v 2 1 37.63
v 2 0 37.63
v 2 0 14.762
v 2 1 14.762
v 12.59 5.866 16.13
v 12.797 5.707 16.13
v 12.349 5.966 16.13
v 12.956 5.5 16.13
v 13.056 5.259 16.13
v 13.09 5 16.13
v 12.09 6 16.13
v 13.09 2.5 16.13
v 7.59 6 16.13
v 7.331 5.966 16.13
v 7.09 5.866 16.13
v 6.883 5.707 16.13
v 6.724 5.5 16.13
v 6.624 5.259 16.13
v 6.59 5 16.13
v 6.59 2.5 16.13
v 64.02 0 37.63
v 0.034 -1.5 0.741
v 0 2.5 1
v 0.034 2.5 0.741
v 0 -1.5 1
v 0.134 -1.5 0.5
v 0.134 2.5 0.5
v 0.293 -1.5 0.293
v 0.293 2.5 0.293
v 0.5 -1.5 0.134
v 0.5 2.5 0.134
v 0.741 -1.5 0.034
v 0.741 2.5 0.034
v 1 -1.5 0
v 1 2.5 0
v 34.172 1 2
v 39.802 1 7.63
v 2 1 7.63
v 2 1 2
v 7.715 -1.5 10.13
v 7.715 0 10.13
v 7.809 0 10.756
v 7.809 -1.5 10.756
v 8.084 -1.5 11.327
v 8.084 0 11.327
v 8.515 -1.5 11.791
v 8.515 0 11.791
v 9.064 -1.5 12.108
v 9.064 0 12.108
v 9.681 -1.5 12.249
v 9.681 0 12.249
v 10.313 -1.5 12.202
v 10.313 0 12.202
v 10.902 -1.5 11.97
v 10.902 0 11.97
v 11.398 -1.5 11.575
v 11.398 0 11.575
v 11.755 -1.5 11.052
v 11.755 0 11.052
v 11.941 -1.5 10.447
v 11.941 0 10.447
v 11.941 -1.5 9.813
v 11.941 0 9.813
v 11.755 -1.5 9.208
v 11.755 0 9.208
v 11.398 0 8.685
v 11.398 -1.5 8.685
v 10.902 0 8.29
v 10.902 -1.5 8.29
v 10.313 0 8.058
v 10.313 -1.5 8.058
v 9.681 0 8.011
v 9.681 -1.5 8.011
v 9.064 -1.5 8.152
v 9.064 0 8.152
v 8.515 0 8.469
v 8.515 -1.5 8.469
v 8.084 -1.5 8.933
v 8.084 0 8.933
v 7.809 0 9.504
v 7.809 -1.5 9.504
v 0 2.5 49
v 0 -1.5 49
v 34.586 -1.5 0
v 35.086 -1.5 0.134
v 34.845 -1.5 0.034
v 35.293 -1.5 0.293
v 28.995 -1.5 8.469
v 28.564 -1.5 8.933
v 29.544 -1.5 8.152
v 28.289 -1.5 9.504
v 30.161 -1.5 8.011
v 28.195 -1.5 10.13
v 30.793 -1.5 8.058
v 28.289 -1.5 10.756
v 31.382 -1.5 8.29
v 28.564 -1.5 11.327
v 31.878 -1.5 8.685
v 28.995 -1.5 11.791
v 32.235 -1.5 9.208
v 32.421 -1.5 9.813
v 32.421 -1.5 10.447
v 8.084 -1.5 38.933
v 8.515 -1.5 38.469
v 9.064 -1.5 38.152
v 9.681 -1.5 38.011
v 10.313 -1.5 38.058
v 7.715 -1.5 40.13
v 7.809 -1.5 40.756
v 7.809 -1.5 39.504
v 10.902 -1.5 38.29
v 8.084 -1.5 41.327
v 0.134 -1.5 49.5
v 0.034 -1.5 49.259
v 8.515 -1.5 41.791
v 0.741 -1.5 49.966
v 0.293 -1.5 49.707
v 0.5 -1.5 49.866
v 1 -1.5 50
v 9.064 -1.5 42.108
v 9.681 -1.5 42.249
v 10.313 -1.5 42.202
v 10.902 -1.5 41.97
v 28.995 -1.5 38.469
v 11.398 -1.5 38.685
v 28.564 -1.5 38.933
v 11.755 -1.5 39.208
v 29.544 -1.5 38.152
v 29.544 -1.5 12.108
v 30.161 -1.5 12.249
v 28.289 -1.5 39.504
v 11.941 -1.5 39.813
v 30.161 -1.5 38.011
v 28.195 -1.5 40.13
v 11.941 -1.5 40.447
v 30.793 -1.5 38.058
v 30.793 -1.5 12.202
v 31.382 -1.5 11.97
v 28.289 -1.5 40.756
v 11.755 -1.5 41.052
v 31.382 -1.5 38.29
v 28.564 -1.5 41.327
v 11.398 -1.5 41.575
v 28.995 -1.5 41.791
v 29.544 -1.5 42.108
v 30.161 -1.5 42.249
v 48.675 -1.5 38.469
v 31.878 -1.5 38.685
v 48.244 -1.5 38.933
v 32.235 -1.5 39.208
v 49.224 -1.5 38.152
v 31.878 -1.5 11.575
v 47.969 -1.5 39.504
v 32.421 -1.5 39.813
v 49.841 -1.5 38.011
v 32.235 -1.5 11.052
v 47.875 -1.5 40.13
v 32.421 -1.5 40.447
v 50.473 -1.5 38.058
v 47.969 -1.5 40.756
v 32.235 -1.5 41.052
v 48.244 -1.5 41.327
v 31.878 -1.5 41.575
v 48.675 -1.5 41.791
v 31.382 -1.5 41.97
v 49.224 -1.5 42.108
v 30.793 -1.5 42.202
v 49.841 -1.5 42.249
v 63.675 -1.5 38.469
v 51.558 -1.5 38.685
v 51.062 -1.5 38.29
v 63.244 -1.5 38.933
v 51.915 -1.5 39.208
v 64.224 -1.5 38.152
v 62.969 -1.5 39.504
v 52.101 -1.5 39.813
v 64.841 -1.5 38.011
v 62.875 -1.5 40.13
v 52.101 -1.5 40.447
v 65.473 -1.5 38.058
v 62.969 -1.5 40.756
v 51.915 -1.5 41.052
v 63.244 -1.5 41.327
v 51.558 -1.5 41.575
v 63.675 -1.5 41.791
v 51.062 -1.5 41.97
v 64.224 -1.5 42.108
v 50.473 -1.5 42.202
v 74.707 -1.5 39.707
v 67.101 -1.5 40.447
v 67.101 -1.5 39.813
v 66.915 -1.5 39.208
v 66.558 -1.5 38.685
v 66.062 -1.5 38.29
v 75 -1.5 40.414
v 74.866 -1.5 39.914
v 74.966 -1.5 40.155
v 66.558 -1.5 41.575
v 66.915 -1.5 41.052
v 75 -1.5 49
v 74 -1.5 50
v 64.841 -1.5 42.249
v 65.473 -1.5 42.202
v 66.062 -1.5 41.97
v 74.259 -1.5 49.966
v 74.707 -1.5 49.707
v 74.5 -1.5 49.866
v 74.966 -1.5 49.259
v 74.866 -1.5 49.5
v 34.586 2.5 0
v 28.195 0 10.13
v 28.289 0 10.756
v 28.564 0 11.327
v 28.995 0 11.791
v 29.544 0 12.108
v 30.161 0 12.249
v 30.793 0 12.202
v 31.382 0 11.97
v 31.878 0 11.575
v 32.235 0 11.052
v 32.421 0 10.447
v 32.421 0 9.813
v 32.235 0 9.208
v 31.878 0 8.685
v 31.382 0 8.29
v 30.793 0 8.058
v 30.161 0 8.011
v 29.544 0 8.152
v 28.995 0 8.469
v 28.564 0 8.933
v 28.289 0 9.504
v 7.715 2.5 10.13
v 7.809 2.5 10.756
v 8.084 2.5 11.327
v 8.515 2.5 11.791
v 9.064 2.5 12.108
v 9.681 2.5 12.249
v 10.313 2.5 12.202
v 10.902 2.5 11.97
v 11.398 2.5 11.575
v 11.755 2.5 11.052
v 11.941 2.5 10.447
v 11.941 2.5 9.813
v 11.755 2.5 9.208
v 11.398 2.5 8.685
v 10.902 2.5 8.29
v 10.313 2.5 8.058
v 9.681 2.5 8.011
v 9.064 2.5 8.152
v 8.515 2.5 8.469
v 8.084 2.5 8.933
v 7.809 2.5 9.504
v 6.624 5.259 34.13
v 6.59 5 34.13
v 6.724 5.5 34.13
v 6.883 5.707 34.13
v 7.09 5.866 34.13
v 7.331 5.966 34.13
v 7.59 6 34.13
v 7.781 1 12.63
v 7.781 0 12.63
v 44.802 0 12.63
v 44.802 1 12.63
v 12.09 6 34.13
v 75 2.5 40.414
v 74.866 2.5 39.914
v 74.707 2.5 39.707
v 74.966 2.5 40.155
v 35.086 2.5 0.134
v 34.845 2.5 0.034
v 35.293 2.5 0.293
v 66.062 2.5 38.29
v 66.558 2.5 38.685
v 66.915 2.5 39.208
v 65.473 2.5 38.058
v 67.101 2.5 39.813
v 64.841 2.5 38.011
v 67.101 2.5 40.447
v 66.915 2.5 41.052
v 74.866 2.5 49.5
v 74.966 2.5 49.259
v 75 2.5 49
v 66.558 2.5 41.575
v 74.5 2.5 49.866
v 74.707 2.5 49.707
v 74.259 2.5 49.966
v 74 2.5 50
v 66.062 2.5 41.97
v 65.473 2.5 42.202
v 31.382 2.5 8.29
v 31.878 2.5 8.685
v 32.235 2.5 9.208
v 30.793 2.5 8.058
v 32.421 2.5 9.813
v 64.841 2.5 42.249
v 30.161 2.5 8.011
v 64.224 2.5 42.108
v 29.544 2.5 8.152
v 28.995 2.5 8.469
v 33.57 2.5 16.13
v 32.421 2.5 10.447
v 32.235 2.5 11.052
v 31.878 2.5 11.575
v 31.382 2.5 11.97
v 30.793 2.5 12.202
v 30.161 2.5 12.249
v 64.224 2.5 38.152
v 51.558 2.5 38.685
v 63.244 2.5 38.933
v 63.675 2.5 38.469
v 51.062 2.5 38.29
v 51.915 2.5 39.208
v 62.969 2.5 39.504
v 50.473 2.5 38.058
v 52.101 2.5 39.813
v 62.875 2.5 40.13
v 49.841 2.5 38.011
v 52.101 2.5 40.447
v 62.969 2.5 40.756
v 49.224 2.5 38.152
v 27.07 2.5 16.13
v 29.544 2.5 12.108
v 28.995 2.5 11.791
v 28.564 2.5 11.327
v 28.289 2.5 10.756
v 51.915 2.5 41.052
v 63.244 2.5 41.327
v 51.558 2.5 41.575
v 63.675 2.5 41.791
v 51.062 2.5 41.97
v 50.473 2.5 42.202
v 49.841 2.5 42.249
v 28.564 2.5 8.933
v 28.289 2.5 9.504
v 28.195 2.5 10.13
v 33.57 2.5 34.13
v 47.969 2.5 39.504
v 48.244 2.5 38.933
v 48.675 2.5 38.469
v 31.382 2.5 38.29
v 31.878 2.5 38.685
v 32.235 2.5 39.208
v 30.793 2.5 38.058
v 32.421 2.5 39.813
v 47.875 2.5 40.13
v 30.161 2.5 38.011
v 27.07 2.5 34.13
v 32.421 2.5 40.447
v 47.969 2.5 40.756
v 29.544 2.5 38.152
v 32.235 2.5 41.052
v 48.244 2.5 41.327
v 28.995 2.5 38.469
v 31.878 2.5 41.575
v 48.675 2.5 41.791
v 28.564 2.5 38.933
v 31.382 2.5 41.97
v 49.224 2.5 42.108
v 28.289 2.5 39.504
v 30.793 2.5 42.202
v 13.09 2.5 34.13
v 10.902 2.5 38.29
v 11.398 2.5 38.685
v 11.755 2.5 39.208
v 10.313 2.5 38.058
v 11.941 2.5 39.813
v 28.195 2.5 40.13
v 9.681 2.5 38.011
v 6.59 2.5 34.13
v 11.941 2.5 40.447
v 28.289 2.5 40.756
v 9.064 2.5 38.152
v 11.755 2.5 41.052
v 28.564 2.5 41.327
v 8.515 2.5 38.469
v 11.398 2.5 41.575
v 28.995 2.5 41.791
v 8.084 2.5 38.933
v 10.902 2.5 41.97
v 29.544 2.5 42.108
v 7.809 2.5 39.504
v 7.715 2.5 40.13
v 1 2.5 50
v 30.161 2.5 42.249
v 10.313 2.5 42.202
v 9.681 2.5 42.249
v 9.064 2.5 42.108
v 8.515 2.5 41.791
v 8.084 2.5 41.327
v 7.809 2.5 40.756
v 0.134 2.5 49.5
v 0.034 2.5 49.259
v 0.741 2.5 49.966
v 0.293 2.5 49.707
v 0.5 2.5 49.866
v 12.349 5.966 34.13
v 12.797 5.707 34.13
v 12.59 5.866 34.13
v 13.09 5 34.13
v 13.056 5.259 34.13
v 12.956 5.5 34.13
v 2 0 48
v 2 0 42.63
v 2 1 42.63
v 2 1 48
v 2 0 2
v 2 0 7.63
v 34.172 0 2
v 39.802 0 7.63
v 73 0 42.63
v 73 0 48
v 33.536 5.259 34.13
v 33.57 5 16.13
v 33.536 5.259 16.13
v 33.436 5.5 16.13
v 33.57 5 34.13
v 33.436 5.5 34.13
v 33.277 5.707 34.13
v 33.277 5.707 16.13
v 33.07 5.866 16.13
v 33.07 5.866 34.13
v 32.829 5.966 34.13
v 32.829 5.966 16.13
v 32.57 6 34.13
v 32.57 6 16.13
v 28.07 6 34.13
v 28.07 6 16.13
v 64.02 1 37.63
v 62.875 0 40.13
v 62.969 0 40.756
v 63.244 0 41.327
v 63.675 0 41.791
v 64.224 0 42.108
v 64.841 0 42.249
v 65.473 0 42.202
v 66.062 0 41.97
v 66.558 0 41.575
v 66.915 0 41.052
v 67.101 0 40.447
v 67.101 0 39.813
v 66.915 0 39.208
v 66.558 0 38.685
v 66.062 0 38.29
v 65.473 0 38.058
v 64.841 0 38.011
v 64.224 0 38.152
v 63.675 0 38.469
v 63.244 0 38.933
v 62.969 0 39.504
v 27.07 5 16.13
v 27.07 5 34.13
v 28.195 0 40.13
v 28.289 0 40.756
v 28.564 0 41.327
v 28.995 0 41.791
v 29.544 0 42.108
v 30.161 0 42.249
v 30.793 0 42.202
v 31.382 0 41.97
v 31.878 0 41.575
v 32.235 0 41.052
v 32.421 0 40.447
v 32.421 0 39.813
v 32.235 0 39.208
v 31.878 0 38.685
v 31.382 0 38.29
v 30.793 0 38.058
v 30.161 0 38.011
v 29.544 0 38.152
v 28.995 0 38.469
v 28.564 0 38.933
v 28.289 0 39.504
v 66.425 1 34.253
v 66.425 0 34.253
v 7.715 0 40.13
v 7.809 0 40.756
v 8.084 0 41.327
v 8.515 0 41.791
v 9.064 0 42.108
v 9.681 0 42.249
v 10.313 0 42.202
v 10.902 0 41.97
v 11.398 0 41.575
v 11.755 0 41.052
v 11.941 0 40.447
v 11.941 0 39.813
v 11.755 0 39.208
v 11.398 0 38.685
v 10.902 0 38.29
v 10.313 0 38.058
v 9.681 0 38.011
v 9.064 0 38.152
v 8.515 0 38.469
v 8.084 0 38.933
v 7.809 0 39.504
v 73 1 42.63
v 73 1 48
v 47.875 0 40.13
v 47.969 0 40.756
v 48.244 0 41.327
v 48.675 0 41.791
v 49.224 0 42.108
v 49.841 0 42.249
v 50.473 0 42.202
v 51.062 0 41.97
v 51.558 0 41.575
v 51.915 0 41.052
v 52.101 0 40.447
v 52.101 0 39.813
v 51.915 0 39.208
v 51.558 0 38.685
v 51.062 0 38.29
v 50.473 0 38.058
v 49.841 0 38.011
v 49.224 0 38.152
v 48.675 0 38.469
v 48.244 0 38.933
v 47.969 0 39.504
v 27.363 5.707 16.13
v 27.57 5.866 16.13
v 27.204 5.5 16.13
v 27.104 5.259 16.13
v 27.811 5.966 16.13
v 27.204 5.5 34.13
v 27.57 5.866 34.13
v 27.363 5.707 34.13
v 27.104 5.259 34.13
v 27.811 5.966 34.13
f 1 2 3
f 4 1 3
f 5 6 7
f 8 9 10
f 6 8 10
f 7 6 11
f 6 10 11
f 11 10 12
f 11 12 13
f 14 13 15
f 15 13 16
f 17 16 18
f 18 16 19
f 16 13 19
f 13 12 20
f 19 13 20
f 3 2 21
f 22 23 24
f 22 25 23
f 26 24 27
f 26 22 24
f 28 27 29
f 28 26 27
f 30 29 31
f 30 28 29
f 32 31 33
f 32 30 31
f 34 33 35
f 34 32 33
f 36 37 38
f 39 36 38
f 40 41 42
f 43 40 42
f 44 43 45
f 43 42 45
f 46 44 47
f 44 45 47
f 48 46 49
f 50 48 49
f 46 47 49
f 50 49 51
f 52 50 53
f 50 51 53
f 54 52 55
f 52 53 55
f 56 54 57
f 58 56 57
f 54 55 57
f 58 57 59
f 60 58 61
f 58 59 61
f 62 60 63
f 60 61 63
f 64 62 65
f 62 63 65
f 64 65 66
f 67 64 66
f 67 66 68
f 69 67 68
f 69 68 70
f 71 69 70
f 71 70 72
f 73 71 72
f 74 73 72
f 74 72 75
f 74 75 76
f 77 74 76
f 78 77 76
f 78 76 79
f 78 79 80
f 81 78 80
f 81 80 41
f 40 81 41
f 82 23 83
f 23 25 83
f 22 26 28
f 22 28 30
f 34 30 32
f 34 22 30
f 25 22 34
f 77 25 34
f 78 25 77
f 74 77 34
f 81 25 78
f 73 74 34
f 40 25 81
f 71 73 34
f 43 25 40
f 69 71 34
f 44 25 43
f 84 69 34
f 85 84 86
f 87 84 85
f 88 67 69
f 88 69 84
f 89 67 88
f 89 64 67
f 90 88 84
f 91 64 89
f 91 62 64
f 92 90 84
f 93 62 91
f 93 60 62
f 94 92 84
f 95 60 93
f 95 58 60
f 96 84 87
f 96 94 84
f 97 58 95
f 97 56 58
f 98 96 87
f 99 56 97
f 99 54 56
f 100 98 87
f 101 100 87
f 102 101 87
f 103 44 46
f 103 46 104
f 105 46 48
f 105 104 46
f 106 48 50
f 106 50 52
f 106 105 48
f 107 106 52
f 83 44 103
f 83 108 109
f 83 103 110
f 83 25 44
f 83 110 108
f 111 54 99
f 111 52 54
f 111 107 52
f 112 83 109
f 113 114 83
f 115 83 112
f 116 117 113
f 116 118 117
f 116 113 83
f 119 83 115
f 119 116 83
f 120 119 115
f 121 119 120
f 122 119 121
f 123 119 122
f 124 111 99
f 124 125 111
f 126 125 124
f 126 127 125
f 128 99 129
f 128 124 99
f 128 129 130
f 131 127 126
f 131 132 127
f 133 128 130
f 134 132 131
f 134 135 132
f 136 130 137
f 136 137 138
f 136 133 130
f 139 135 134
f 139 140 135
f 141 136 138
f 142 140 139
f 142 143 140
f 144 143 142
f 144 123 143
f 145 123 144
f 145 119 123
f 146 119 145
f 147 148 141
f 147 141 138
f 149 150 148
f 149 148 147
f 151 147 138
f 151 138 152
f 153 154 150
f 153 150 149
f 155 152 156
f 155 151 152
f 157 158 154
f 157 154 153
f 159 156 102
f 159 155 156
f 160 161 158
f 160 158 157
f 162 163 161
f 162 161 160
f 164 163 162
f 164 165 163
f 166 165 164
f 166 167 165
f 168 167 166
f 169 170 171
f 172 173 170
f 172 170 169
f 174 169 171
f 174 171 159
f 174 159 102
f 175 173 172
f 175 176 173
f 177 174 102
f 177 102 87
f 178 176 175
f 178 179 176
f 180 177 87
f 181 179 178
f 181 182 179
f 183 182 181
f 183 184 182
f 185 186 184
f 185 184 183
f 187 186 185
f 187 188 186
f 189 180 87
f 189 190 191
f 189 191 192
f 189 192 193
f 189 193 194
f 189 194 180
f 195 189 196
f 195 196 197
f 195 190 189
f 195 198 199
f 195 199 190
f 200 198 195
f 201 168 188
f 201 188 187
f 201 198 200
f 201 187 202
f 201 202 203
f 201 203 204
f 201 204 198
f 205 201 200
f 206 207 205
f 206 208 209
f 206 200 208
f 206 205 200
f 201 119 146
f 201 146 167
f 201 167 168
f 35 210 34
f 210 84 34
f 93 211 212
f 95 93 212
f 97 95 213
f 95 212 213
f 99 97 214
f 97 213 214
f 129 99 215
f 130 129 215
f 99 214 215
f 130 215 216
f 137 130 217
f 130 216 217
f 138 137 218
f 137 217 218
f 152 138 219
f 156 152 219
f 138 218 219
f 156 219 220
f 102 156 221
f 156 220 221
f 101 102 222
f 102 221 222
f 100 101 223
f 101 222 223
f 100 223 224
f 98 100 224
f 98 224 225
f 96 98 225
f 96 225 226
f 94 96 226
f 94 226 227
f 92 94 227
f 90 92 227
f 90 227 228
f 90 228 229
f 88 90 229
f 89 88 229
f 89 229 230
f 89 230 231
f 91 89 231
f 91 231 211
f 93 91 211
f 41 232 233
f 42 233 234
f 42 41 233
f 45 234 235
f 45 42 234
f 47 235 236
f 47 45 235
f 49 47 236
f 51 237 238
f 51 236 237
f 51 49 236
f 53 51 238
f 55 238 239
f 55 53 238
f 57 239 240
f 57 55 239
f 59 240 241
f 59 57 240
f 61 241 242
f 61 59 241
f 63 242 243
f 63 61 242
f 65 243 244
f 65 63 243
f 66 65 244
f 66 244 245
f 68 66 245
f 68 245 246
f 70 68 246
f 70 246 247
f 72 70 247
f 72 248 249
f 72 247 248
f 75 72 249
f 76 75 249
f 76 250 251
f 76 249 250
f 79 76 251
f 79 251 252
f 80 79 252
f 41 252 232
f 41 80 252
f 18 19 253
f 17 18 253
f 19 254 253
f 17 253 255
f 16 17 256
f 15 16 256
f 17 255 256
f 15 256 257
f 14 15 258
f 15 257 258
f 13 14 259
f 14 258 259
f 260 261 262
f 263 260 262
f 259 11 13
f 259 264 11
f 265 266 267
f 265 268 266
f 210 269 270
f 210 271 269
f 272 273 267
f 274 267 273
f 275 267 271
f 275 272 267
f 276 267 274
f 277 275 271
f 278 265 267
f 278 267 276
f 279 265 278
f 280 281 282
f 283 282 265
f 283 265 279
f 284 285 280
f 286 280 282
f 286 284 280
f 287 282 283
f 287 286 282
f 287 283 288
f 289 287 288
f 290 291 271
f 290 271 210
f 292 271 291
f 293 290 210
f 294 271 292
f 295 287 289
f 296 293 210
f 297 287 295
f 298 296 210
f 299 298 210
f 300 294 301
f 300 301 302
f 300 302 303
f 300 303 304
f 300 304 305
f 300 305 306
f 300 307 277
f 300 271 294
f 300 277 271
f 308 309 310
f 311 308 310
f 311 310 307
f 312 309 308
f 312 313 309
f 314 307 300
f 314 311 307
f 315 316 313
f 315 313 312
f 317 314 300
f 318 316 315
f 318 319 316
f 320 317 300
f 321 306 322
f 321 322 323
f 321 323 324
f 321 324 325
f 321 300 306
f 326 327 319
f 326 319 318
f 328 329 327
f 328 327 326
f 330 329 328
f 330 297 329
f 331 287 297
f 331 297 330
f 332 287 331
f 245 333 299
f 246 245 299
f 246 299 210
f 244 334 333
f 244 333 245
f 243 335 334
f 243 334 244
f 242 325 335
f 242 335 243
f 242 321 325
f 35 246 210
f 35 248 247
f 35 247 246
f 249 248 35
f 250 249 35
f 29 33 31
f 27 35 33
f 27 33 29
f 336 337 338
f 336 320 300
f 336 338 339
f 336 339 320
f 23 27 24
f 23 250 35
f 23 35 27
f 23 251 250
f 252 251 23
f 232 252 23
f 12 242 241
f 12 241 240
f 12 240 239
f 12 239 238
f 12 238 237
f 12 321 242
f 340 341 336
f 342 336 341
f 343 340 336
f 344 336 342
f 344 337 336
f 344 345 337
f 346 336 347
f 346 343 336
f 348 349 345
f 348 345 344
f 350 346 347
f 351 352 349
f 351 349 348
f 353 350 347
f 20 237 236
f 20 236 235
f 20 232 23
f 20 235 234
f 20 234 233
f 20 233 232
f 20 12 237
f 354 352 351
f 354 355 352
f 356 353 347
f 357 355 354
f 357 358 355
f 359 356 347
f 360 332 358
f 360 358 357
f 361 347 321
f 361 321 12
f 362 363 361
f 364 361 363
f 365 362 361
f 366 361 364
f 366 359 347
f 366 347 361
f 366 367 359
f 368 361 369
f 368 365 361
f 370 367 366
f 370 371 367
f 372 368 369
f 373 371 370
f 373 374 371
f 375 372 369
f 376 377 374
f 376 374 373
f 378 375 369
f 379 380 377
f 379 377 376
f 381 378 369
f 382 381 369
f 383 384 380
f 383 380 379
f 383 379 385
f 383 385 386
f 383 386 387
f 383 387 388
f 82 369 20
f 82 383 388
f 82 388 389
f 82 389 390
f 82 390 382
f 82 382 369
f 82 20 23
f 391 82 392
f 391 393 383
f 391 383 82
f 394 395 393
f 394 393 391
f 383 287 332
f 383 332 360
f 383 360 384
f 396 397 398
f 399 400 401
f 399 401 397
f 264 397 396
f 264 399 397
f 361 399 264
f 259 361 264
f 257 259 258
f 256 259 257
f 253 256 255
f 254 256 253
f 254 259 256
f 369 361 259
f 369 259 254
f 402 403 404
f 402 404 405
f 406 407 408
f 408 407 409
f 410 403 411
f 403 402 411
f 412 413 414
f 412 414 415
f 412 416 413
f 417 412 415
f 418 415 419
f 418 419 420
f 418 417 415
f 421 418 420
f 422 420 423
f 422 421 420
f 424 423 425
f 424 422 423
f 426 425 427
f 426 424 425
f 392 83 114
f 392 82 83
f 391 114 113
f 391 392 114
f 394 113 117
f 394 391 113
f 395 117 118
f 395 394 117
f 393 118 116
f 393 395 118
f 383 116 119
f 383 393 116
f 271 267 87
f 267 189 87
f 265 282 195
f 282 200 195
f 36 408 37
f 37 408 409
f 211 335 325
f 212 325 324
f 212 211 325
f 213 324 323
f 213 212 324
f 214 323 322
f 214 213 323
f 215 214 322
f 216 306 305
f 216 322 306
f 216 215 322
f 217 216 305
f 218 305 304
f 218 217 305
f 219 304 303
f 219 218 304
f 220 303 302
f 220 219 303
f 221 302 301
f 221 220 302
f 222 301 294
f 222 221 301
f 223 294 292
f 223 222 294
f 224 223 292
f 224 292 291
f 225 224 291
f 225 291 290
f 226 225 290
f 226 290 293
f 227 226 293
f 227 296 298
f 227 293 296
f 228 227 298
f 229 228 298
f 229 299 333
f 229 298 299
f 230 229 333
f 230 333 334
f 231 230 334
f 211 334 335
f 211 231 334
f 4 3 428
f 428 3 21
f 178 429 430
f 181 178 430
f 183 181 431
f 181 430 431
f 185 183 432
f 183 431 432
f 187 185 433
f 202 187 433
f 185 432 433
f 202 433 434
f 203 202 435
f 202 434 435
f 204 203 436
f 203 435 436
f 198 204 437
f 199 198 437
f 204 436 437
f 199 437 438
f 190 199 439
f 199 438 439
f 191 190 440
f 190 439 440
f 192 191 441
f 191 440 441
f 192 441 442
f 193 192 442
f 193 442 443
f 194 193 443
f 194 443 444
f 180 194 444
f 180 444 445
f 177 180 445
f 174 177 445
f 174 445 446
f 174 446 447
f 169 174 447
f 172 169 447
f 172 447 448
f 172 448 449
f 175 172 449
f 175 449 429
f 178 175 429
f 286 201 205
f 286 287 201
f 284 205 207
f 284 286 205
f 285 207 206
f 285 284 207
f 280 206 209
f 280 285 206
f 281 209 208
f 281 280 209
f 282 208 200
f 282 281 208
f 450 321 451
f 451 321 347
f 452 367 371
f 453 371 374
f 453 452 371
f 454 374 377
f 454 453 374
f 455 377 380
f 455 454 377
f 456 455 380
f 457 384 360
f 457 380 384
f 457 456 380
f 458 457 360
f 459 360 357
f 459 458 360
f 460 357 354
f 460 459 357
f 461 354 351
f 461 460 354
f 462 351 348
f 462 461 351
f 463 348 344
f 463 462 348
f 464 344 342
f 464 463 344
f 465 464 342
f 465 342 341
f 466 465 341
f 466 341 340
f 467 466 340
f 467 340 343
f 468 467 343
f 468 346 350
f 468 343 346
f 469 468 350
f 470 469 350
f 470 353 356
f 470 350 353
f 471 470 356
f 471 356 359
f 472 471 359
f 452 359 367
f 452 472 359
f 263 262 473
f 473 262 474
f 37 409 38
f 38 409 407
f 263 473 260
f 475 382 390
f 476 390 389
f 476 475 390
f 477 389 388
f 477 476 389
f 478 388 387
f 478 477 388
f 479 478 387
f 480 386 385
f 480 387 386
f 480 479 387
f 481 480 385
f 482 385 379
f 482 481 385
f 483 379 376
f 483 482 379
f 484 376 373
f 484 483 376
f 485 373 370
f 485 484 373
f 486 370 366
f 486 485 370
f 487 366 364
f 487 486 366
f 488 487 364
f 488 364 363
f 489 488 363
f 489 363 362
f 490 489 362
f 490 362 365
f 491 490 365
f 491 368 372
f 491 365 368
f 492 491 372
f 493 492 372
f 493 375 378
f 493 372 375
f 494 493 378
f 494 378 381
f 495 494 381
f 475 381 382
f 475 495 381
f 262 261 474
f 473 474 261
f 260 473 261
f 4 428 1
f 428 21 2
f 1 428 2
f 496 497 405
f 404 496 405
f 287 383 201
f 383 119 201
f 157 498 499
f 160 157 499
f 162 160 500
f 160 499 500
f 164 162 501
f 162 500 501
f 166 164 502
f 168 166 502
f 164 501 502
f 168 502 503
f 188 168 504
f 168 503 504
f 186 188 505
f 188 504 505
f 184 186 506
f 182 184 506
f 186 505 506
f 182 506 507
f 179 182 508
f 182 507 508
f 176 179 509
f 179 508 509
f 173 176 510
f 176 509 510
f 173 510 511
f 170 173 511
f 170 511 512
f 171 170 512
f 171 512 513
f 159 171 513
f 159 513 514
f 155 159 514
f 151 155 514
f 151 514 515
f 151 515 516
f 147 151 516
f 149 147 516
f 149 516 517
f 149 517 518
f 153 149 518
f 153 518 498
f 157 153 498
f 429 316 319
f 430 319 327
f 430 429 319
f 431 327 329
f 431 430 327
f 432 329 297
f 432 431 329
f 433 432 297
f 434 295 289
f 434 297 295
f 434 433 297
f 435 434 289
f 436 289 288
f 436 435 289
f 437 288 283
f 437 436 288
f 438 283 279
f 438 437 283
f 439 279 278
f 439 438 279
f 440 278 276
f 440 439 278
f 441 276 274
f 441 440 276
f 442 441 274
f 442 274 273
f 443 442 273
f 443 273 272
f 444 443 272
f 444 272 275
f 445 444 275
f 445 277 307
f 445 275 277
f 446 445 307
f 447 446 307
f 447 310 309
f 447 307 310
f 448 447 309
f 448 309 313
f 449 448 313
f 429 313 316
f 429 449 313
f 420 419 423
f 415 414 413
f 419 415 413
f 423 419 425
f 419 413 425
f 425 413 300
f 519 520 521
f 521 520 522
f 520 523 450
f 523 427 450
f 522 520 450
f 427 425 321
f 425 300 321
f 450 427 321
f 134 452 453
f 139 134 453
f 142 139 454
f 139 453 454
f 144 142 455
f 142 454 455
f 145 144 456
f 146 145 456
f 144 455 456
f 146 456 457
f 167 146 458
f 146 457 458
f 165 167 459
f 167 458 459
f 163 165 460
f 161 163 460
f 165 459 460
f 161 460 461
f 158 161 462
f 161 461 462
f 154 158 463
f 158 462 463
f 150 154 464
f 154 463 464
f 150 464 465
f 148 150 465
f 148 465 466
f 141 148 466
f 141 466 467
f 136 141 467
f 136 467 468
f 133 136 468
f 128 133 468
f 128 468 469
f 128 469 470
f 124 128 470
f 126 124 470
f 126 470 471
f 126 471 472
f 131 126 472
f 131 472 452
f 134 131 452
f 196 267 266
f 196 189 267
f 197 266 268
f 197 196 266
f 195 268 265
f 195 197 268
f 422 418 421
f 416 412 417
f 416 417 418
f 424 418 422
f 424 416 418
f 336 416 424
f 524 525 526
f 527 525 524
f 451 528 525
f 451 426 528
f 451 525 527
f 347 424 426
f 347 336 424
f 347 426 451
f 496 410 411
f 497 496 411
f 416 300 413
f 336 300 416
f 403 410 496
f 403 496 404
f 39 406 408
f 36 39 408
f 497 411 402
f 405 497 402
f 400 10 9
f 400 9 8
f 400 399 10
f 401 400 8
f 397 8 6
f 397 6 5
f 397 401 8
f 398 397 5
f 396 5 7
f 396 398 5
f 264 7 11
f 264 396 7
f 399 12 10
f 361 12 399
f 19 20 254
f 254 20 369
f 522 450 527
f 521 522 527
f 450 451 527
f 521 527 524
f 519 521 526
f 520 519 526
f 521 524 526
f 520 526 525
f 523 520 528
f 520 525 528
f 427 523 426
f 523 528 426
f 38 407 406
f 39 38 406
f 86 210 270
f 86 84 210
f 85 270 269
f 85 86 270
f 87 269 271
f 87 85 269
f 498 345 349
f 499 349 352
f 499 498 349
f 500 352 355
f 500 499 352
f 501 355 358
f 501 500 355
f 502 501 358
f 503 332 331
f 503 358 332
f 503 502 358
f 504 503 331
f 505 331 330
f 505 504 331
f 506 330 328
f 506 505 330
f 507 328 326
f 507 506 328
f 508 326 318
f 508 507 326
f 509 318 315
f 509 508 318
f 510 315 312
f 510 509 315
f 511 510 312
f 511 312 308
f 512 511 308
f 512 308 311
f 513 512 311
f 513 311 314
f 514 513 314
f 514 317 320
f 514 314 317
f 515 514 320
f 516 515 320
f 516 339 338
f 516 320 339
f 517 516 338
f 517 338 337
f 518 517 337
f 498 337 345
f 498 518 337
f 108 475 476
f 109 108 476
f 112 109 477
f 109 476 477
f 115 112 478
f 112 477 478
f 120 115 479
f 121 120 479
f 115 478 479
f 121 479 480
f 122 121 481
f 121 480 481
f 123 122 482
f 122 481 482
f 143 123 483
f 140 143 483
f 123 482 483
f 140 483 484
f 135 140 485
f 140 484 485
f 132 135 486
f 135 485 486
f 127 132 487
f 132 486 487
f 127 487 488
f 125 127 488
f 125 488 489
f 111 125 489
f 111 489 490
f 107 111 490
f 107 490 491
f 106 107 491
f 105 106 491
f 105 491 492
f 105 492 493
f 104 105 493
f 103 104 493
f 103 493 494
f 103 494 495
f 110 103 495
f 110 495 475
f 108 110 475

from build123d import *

# Parameters (mm, degrees)
F1_DEPTH      = 1.5
F2_W          = 71
F2_H          = 5.37
F3_DEPTH      = 1
F5_DEPTH      = 1.5
F6_R          = 2.125
F7_DEPTH      = 25
F7_DEPTH_BACK = 25
F8_W          = 6.5
F8_H          = 18
F9_DEPTH      = 3.5
F10_R         = 1


with BuildPart() as f1:
    # F0 (on Front) → F1 (new body)
    with BuildSketch(Plane.XZ):
        Polygon((0, 50), (0, 0), (35, 0), (75, 40), (75, 50), align=None)
    extrude(amount=F1_DEPTH)

    # F2 (on face) → F3 (join)
    with BuildSketch(Plane(origin=(0, 0, 0), x_dir=(-1, 0, 0), z_dir=(0, 1, 0))):
        Polygon((0, 0), (0, 50), (-75, 50), (-75, 40), (-35, 0), align=None)
        Polygon((-2, 7.63), (-2, 2), (-34.1715728753, 2), (-39.8015728753, 7.63), align=None, mode=Mode.SUBTRACT)
        Polygon((-44.8015728753, 12.63), (-66.4248850161, 34.2533121408), (-7.7811020593, 12.63), align=None, mode=Mode.SUBTRACT)
        Polygon((-2, 14.7616253496), (-64.020470816, 37.63), (-2, 37.63), align=None, mode=Mode.SUBTRACT)
        with Locations((-37.5, 45.315)):
            Rectangle(F2_W, F2_H, mode=Mode.SUBTRACT)
    extrude(amount=F3_DEPTH)

    # F4 (on face) → F5 (join)
    with BuildSketch(Plane(origin=(0, 1, 0), x_dir=(-1, 0, 0), z_dir=(0, 1, 0))):
        Polygon((0, 0), (0, 50), (-75, 50), (-75, 40), (-35, 0), align=None)
    extrude(amount=F5_DEPTH)

    # F6 (on face) → F7 (cut, two sides)
    with BuildSketch(Plane(origin=(0, 0, 0), x_dir=(-1, 0, 0), z_dir=(0, 1, 0))) as f7_sk:
        with Locations((-9.84, 40.13)):
            Circle(F6_R)
        with Locations((-9.84, 10.13)):
            Circle(F6_R)
        with Locations((-30.32, 40.13)):
            Circle(F6_R)
        with Locations((-30.32, 10.13)):
            Circle(F6_R)
        with Locations((-50, 40.13)):
            Circle(F6_R)
        with Locations((-65, 40.13)):
            Circle(F6_R)
    extrude(amount=-F7_DEPTH, mode=Mode.SUBTRACT)
    extrude(f7_sk.sketch, amount=F7_DEPTH_BACK, mode=Mode.SUBTRACT)

    # F8 (on face) → F9 (join)
    with BuildSketch(Plane(origin=(0, 2.5, 0), x_dir=(-1, 0, 0), z_dir=(0, 1, 0))):
        with Locations((-9.84, 25.13)):
            Rectangle(F8_W, F8_H)
        with Locations((-30.32, 25.13)):
            Rectangle(F8_W, F8_H)
    extrude(amount=F9_DEPTH)

    # F10
    f10_edges = [f1.edges().sort_by_distance(p)[0] for p in [
        (33.57, 6, 25.13),
        (27.07, 6, 25.13),
        (13.09, 6, 25.13),
        (6.59, 6, 25.13),
        (0, 0.5, 50),
        (0, 0.5, 0),
        (75, 0.5, 50),
        (75, 0.5, 40),
        (35, 0.5, 0),
    ]]
    fillet(f10_edges, radius=F10_R)


solid = f1.part
